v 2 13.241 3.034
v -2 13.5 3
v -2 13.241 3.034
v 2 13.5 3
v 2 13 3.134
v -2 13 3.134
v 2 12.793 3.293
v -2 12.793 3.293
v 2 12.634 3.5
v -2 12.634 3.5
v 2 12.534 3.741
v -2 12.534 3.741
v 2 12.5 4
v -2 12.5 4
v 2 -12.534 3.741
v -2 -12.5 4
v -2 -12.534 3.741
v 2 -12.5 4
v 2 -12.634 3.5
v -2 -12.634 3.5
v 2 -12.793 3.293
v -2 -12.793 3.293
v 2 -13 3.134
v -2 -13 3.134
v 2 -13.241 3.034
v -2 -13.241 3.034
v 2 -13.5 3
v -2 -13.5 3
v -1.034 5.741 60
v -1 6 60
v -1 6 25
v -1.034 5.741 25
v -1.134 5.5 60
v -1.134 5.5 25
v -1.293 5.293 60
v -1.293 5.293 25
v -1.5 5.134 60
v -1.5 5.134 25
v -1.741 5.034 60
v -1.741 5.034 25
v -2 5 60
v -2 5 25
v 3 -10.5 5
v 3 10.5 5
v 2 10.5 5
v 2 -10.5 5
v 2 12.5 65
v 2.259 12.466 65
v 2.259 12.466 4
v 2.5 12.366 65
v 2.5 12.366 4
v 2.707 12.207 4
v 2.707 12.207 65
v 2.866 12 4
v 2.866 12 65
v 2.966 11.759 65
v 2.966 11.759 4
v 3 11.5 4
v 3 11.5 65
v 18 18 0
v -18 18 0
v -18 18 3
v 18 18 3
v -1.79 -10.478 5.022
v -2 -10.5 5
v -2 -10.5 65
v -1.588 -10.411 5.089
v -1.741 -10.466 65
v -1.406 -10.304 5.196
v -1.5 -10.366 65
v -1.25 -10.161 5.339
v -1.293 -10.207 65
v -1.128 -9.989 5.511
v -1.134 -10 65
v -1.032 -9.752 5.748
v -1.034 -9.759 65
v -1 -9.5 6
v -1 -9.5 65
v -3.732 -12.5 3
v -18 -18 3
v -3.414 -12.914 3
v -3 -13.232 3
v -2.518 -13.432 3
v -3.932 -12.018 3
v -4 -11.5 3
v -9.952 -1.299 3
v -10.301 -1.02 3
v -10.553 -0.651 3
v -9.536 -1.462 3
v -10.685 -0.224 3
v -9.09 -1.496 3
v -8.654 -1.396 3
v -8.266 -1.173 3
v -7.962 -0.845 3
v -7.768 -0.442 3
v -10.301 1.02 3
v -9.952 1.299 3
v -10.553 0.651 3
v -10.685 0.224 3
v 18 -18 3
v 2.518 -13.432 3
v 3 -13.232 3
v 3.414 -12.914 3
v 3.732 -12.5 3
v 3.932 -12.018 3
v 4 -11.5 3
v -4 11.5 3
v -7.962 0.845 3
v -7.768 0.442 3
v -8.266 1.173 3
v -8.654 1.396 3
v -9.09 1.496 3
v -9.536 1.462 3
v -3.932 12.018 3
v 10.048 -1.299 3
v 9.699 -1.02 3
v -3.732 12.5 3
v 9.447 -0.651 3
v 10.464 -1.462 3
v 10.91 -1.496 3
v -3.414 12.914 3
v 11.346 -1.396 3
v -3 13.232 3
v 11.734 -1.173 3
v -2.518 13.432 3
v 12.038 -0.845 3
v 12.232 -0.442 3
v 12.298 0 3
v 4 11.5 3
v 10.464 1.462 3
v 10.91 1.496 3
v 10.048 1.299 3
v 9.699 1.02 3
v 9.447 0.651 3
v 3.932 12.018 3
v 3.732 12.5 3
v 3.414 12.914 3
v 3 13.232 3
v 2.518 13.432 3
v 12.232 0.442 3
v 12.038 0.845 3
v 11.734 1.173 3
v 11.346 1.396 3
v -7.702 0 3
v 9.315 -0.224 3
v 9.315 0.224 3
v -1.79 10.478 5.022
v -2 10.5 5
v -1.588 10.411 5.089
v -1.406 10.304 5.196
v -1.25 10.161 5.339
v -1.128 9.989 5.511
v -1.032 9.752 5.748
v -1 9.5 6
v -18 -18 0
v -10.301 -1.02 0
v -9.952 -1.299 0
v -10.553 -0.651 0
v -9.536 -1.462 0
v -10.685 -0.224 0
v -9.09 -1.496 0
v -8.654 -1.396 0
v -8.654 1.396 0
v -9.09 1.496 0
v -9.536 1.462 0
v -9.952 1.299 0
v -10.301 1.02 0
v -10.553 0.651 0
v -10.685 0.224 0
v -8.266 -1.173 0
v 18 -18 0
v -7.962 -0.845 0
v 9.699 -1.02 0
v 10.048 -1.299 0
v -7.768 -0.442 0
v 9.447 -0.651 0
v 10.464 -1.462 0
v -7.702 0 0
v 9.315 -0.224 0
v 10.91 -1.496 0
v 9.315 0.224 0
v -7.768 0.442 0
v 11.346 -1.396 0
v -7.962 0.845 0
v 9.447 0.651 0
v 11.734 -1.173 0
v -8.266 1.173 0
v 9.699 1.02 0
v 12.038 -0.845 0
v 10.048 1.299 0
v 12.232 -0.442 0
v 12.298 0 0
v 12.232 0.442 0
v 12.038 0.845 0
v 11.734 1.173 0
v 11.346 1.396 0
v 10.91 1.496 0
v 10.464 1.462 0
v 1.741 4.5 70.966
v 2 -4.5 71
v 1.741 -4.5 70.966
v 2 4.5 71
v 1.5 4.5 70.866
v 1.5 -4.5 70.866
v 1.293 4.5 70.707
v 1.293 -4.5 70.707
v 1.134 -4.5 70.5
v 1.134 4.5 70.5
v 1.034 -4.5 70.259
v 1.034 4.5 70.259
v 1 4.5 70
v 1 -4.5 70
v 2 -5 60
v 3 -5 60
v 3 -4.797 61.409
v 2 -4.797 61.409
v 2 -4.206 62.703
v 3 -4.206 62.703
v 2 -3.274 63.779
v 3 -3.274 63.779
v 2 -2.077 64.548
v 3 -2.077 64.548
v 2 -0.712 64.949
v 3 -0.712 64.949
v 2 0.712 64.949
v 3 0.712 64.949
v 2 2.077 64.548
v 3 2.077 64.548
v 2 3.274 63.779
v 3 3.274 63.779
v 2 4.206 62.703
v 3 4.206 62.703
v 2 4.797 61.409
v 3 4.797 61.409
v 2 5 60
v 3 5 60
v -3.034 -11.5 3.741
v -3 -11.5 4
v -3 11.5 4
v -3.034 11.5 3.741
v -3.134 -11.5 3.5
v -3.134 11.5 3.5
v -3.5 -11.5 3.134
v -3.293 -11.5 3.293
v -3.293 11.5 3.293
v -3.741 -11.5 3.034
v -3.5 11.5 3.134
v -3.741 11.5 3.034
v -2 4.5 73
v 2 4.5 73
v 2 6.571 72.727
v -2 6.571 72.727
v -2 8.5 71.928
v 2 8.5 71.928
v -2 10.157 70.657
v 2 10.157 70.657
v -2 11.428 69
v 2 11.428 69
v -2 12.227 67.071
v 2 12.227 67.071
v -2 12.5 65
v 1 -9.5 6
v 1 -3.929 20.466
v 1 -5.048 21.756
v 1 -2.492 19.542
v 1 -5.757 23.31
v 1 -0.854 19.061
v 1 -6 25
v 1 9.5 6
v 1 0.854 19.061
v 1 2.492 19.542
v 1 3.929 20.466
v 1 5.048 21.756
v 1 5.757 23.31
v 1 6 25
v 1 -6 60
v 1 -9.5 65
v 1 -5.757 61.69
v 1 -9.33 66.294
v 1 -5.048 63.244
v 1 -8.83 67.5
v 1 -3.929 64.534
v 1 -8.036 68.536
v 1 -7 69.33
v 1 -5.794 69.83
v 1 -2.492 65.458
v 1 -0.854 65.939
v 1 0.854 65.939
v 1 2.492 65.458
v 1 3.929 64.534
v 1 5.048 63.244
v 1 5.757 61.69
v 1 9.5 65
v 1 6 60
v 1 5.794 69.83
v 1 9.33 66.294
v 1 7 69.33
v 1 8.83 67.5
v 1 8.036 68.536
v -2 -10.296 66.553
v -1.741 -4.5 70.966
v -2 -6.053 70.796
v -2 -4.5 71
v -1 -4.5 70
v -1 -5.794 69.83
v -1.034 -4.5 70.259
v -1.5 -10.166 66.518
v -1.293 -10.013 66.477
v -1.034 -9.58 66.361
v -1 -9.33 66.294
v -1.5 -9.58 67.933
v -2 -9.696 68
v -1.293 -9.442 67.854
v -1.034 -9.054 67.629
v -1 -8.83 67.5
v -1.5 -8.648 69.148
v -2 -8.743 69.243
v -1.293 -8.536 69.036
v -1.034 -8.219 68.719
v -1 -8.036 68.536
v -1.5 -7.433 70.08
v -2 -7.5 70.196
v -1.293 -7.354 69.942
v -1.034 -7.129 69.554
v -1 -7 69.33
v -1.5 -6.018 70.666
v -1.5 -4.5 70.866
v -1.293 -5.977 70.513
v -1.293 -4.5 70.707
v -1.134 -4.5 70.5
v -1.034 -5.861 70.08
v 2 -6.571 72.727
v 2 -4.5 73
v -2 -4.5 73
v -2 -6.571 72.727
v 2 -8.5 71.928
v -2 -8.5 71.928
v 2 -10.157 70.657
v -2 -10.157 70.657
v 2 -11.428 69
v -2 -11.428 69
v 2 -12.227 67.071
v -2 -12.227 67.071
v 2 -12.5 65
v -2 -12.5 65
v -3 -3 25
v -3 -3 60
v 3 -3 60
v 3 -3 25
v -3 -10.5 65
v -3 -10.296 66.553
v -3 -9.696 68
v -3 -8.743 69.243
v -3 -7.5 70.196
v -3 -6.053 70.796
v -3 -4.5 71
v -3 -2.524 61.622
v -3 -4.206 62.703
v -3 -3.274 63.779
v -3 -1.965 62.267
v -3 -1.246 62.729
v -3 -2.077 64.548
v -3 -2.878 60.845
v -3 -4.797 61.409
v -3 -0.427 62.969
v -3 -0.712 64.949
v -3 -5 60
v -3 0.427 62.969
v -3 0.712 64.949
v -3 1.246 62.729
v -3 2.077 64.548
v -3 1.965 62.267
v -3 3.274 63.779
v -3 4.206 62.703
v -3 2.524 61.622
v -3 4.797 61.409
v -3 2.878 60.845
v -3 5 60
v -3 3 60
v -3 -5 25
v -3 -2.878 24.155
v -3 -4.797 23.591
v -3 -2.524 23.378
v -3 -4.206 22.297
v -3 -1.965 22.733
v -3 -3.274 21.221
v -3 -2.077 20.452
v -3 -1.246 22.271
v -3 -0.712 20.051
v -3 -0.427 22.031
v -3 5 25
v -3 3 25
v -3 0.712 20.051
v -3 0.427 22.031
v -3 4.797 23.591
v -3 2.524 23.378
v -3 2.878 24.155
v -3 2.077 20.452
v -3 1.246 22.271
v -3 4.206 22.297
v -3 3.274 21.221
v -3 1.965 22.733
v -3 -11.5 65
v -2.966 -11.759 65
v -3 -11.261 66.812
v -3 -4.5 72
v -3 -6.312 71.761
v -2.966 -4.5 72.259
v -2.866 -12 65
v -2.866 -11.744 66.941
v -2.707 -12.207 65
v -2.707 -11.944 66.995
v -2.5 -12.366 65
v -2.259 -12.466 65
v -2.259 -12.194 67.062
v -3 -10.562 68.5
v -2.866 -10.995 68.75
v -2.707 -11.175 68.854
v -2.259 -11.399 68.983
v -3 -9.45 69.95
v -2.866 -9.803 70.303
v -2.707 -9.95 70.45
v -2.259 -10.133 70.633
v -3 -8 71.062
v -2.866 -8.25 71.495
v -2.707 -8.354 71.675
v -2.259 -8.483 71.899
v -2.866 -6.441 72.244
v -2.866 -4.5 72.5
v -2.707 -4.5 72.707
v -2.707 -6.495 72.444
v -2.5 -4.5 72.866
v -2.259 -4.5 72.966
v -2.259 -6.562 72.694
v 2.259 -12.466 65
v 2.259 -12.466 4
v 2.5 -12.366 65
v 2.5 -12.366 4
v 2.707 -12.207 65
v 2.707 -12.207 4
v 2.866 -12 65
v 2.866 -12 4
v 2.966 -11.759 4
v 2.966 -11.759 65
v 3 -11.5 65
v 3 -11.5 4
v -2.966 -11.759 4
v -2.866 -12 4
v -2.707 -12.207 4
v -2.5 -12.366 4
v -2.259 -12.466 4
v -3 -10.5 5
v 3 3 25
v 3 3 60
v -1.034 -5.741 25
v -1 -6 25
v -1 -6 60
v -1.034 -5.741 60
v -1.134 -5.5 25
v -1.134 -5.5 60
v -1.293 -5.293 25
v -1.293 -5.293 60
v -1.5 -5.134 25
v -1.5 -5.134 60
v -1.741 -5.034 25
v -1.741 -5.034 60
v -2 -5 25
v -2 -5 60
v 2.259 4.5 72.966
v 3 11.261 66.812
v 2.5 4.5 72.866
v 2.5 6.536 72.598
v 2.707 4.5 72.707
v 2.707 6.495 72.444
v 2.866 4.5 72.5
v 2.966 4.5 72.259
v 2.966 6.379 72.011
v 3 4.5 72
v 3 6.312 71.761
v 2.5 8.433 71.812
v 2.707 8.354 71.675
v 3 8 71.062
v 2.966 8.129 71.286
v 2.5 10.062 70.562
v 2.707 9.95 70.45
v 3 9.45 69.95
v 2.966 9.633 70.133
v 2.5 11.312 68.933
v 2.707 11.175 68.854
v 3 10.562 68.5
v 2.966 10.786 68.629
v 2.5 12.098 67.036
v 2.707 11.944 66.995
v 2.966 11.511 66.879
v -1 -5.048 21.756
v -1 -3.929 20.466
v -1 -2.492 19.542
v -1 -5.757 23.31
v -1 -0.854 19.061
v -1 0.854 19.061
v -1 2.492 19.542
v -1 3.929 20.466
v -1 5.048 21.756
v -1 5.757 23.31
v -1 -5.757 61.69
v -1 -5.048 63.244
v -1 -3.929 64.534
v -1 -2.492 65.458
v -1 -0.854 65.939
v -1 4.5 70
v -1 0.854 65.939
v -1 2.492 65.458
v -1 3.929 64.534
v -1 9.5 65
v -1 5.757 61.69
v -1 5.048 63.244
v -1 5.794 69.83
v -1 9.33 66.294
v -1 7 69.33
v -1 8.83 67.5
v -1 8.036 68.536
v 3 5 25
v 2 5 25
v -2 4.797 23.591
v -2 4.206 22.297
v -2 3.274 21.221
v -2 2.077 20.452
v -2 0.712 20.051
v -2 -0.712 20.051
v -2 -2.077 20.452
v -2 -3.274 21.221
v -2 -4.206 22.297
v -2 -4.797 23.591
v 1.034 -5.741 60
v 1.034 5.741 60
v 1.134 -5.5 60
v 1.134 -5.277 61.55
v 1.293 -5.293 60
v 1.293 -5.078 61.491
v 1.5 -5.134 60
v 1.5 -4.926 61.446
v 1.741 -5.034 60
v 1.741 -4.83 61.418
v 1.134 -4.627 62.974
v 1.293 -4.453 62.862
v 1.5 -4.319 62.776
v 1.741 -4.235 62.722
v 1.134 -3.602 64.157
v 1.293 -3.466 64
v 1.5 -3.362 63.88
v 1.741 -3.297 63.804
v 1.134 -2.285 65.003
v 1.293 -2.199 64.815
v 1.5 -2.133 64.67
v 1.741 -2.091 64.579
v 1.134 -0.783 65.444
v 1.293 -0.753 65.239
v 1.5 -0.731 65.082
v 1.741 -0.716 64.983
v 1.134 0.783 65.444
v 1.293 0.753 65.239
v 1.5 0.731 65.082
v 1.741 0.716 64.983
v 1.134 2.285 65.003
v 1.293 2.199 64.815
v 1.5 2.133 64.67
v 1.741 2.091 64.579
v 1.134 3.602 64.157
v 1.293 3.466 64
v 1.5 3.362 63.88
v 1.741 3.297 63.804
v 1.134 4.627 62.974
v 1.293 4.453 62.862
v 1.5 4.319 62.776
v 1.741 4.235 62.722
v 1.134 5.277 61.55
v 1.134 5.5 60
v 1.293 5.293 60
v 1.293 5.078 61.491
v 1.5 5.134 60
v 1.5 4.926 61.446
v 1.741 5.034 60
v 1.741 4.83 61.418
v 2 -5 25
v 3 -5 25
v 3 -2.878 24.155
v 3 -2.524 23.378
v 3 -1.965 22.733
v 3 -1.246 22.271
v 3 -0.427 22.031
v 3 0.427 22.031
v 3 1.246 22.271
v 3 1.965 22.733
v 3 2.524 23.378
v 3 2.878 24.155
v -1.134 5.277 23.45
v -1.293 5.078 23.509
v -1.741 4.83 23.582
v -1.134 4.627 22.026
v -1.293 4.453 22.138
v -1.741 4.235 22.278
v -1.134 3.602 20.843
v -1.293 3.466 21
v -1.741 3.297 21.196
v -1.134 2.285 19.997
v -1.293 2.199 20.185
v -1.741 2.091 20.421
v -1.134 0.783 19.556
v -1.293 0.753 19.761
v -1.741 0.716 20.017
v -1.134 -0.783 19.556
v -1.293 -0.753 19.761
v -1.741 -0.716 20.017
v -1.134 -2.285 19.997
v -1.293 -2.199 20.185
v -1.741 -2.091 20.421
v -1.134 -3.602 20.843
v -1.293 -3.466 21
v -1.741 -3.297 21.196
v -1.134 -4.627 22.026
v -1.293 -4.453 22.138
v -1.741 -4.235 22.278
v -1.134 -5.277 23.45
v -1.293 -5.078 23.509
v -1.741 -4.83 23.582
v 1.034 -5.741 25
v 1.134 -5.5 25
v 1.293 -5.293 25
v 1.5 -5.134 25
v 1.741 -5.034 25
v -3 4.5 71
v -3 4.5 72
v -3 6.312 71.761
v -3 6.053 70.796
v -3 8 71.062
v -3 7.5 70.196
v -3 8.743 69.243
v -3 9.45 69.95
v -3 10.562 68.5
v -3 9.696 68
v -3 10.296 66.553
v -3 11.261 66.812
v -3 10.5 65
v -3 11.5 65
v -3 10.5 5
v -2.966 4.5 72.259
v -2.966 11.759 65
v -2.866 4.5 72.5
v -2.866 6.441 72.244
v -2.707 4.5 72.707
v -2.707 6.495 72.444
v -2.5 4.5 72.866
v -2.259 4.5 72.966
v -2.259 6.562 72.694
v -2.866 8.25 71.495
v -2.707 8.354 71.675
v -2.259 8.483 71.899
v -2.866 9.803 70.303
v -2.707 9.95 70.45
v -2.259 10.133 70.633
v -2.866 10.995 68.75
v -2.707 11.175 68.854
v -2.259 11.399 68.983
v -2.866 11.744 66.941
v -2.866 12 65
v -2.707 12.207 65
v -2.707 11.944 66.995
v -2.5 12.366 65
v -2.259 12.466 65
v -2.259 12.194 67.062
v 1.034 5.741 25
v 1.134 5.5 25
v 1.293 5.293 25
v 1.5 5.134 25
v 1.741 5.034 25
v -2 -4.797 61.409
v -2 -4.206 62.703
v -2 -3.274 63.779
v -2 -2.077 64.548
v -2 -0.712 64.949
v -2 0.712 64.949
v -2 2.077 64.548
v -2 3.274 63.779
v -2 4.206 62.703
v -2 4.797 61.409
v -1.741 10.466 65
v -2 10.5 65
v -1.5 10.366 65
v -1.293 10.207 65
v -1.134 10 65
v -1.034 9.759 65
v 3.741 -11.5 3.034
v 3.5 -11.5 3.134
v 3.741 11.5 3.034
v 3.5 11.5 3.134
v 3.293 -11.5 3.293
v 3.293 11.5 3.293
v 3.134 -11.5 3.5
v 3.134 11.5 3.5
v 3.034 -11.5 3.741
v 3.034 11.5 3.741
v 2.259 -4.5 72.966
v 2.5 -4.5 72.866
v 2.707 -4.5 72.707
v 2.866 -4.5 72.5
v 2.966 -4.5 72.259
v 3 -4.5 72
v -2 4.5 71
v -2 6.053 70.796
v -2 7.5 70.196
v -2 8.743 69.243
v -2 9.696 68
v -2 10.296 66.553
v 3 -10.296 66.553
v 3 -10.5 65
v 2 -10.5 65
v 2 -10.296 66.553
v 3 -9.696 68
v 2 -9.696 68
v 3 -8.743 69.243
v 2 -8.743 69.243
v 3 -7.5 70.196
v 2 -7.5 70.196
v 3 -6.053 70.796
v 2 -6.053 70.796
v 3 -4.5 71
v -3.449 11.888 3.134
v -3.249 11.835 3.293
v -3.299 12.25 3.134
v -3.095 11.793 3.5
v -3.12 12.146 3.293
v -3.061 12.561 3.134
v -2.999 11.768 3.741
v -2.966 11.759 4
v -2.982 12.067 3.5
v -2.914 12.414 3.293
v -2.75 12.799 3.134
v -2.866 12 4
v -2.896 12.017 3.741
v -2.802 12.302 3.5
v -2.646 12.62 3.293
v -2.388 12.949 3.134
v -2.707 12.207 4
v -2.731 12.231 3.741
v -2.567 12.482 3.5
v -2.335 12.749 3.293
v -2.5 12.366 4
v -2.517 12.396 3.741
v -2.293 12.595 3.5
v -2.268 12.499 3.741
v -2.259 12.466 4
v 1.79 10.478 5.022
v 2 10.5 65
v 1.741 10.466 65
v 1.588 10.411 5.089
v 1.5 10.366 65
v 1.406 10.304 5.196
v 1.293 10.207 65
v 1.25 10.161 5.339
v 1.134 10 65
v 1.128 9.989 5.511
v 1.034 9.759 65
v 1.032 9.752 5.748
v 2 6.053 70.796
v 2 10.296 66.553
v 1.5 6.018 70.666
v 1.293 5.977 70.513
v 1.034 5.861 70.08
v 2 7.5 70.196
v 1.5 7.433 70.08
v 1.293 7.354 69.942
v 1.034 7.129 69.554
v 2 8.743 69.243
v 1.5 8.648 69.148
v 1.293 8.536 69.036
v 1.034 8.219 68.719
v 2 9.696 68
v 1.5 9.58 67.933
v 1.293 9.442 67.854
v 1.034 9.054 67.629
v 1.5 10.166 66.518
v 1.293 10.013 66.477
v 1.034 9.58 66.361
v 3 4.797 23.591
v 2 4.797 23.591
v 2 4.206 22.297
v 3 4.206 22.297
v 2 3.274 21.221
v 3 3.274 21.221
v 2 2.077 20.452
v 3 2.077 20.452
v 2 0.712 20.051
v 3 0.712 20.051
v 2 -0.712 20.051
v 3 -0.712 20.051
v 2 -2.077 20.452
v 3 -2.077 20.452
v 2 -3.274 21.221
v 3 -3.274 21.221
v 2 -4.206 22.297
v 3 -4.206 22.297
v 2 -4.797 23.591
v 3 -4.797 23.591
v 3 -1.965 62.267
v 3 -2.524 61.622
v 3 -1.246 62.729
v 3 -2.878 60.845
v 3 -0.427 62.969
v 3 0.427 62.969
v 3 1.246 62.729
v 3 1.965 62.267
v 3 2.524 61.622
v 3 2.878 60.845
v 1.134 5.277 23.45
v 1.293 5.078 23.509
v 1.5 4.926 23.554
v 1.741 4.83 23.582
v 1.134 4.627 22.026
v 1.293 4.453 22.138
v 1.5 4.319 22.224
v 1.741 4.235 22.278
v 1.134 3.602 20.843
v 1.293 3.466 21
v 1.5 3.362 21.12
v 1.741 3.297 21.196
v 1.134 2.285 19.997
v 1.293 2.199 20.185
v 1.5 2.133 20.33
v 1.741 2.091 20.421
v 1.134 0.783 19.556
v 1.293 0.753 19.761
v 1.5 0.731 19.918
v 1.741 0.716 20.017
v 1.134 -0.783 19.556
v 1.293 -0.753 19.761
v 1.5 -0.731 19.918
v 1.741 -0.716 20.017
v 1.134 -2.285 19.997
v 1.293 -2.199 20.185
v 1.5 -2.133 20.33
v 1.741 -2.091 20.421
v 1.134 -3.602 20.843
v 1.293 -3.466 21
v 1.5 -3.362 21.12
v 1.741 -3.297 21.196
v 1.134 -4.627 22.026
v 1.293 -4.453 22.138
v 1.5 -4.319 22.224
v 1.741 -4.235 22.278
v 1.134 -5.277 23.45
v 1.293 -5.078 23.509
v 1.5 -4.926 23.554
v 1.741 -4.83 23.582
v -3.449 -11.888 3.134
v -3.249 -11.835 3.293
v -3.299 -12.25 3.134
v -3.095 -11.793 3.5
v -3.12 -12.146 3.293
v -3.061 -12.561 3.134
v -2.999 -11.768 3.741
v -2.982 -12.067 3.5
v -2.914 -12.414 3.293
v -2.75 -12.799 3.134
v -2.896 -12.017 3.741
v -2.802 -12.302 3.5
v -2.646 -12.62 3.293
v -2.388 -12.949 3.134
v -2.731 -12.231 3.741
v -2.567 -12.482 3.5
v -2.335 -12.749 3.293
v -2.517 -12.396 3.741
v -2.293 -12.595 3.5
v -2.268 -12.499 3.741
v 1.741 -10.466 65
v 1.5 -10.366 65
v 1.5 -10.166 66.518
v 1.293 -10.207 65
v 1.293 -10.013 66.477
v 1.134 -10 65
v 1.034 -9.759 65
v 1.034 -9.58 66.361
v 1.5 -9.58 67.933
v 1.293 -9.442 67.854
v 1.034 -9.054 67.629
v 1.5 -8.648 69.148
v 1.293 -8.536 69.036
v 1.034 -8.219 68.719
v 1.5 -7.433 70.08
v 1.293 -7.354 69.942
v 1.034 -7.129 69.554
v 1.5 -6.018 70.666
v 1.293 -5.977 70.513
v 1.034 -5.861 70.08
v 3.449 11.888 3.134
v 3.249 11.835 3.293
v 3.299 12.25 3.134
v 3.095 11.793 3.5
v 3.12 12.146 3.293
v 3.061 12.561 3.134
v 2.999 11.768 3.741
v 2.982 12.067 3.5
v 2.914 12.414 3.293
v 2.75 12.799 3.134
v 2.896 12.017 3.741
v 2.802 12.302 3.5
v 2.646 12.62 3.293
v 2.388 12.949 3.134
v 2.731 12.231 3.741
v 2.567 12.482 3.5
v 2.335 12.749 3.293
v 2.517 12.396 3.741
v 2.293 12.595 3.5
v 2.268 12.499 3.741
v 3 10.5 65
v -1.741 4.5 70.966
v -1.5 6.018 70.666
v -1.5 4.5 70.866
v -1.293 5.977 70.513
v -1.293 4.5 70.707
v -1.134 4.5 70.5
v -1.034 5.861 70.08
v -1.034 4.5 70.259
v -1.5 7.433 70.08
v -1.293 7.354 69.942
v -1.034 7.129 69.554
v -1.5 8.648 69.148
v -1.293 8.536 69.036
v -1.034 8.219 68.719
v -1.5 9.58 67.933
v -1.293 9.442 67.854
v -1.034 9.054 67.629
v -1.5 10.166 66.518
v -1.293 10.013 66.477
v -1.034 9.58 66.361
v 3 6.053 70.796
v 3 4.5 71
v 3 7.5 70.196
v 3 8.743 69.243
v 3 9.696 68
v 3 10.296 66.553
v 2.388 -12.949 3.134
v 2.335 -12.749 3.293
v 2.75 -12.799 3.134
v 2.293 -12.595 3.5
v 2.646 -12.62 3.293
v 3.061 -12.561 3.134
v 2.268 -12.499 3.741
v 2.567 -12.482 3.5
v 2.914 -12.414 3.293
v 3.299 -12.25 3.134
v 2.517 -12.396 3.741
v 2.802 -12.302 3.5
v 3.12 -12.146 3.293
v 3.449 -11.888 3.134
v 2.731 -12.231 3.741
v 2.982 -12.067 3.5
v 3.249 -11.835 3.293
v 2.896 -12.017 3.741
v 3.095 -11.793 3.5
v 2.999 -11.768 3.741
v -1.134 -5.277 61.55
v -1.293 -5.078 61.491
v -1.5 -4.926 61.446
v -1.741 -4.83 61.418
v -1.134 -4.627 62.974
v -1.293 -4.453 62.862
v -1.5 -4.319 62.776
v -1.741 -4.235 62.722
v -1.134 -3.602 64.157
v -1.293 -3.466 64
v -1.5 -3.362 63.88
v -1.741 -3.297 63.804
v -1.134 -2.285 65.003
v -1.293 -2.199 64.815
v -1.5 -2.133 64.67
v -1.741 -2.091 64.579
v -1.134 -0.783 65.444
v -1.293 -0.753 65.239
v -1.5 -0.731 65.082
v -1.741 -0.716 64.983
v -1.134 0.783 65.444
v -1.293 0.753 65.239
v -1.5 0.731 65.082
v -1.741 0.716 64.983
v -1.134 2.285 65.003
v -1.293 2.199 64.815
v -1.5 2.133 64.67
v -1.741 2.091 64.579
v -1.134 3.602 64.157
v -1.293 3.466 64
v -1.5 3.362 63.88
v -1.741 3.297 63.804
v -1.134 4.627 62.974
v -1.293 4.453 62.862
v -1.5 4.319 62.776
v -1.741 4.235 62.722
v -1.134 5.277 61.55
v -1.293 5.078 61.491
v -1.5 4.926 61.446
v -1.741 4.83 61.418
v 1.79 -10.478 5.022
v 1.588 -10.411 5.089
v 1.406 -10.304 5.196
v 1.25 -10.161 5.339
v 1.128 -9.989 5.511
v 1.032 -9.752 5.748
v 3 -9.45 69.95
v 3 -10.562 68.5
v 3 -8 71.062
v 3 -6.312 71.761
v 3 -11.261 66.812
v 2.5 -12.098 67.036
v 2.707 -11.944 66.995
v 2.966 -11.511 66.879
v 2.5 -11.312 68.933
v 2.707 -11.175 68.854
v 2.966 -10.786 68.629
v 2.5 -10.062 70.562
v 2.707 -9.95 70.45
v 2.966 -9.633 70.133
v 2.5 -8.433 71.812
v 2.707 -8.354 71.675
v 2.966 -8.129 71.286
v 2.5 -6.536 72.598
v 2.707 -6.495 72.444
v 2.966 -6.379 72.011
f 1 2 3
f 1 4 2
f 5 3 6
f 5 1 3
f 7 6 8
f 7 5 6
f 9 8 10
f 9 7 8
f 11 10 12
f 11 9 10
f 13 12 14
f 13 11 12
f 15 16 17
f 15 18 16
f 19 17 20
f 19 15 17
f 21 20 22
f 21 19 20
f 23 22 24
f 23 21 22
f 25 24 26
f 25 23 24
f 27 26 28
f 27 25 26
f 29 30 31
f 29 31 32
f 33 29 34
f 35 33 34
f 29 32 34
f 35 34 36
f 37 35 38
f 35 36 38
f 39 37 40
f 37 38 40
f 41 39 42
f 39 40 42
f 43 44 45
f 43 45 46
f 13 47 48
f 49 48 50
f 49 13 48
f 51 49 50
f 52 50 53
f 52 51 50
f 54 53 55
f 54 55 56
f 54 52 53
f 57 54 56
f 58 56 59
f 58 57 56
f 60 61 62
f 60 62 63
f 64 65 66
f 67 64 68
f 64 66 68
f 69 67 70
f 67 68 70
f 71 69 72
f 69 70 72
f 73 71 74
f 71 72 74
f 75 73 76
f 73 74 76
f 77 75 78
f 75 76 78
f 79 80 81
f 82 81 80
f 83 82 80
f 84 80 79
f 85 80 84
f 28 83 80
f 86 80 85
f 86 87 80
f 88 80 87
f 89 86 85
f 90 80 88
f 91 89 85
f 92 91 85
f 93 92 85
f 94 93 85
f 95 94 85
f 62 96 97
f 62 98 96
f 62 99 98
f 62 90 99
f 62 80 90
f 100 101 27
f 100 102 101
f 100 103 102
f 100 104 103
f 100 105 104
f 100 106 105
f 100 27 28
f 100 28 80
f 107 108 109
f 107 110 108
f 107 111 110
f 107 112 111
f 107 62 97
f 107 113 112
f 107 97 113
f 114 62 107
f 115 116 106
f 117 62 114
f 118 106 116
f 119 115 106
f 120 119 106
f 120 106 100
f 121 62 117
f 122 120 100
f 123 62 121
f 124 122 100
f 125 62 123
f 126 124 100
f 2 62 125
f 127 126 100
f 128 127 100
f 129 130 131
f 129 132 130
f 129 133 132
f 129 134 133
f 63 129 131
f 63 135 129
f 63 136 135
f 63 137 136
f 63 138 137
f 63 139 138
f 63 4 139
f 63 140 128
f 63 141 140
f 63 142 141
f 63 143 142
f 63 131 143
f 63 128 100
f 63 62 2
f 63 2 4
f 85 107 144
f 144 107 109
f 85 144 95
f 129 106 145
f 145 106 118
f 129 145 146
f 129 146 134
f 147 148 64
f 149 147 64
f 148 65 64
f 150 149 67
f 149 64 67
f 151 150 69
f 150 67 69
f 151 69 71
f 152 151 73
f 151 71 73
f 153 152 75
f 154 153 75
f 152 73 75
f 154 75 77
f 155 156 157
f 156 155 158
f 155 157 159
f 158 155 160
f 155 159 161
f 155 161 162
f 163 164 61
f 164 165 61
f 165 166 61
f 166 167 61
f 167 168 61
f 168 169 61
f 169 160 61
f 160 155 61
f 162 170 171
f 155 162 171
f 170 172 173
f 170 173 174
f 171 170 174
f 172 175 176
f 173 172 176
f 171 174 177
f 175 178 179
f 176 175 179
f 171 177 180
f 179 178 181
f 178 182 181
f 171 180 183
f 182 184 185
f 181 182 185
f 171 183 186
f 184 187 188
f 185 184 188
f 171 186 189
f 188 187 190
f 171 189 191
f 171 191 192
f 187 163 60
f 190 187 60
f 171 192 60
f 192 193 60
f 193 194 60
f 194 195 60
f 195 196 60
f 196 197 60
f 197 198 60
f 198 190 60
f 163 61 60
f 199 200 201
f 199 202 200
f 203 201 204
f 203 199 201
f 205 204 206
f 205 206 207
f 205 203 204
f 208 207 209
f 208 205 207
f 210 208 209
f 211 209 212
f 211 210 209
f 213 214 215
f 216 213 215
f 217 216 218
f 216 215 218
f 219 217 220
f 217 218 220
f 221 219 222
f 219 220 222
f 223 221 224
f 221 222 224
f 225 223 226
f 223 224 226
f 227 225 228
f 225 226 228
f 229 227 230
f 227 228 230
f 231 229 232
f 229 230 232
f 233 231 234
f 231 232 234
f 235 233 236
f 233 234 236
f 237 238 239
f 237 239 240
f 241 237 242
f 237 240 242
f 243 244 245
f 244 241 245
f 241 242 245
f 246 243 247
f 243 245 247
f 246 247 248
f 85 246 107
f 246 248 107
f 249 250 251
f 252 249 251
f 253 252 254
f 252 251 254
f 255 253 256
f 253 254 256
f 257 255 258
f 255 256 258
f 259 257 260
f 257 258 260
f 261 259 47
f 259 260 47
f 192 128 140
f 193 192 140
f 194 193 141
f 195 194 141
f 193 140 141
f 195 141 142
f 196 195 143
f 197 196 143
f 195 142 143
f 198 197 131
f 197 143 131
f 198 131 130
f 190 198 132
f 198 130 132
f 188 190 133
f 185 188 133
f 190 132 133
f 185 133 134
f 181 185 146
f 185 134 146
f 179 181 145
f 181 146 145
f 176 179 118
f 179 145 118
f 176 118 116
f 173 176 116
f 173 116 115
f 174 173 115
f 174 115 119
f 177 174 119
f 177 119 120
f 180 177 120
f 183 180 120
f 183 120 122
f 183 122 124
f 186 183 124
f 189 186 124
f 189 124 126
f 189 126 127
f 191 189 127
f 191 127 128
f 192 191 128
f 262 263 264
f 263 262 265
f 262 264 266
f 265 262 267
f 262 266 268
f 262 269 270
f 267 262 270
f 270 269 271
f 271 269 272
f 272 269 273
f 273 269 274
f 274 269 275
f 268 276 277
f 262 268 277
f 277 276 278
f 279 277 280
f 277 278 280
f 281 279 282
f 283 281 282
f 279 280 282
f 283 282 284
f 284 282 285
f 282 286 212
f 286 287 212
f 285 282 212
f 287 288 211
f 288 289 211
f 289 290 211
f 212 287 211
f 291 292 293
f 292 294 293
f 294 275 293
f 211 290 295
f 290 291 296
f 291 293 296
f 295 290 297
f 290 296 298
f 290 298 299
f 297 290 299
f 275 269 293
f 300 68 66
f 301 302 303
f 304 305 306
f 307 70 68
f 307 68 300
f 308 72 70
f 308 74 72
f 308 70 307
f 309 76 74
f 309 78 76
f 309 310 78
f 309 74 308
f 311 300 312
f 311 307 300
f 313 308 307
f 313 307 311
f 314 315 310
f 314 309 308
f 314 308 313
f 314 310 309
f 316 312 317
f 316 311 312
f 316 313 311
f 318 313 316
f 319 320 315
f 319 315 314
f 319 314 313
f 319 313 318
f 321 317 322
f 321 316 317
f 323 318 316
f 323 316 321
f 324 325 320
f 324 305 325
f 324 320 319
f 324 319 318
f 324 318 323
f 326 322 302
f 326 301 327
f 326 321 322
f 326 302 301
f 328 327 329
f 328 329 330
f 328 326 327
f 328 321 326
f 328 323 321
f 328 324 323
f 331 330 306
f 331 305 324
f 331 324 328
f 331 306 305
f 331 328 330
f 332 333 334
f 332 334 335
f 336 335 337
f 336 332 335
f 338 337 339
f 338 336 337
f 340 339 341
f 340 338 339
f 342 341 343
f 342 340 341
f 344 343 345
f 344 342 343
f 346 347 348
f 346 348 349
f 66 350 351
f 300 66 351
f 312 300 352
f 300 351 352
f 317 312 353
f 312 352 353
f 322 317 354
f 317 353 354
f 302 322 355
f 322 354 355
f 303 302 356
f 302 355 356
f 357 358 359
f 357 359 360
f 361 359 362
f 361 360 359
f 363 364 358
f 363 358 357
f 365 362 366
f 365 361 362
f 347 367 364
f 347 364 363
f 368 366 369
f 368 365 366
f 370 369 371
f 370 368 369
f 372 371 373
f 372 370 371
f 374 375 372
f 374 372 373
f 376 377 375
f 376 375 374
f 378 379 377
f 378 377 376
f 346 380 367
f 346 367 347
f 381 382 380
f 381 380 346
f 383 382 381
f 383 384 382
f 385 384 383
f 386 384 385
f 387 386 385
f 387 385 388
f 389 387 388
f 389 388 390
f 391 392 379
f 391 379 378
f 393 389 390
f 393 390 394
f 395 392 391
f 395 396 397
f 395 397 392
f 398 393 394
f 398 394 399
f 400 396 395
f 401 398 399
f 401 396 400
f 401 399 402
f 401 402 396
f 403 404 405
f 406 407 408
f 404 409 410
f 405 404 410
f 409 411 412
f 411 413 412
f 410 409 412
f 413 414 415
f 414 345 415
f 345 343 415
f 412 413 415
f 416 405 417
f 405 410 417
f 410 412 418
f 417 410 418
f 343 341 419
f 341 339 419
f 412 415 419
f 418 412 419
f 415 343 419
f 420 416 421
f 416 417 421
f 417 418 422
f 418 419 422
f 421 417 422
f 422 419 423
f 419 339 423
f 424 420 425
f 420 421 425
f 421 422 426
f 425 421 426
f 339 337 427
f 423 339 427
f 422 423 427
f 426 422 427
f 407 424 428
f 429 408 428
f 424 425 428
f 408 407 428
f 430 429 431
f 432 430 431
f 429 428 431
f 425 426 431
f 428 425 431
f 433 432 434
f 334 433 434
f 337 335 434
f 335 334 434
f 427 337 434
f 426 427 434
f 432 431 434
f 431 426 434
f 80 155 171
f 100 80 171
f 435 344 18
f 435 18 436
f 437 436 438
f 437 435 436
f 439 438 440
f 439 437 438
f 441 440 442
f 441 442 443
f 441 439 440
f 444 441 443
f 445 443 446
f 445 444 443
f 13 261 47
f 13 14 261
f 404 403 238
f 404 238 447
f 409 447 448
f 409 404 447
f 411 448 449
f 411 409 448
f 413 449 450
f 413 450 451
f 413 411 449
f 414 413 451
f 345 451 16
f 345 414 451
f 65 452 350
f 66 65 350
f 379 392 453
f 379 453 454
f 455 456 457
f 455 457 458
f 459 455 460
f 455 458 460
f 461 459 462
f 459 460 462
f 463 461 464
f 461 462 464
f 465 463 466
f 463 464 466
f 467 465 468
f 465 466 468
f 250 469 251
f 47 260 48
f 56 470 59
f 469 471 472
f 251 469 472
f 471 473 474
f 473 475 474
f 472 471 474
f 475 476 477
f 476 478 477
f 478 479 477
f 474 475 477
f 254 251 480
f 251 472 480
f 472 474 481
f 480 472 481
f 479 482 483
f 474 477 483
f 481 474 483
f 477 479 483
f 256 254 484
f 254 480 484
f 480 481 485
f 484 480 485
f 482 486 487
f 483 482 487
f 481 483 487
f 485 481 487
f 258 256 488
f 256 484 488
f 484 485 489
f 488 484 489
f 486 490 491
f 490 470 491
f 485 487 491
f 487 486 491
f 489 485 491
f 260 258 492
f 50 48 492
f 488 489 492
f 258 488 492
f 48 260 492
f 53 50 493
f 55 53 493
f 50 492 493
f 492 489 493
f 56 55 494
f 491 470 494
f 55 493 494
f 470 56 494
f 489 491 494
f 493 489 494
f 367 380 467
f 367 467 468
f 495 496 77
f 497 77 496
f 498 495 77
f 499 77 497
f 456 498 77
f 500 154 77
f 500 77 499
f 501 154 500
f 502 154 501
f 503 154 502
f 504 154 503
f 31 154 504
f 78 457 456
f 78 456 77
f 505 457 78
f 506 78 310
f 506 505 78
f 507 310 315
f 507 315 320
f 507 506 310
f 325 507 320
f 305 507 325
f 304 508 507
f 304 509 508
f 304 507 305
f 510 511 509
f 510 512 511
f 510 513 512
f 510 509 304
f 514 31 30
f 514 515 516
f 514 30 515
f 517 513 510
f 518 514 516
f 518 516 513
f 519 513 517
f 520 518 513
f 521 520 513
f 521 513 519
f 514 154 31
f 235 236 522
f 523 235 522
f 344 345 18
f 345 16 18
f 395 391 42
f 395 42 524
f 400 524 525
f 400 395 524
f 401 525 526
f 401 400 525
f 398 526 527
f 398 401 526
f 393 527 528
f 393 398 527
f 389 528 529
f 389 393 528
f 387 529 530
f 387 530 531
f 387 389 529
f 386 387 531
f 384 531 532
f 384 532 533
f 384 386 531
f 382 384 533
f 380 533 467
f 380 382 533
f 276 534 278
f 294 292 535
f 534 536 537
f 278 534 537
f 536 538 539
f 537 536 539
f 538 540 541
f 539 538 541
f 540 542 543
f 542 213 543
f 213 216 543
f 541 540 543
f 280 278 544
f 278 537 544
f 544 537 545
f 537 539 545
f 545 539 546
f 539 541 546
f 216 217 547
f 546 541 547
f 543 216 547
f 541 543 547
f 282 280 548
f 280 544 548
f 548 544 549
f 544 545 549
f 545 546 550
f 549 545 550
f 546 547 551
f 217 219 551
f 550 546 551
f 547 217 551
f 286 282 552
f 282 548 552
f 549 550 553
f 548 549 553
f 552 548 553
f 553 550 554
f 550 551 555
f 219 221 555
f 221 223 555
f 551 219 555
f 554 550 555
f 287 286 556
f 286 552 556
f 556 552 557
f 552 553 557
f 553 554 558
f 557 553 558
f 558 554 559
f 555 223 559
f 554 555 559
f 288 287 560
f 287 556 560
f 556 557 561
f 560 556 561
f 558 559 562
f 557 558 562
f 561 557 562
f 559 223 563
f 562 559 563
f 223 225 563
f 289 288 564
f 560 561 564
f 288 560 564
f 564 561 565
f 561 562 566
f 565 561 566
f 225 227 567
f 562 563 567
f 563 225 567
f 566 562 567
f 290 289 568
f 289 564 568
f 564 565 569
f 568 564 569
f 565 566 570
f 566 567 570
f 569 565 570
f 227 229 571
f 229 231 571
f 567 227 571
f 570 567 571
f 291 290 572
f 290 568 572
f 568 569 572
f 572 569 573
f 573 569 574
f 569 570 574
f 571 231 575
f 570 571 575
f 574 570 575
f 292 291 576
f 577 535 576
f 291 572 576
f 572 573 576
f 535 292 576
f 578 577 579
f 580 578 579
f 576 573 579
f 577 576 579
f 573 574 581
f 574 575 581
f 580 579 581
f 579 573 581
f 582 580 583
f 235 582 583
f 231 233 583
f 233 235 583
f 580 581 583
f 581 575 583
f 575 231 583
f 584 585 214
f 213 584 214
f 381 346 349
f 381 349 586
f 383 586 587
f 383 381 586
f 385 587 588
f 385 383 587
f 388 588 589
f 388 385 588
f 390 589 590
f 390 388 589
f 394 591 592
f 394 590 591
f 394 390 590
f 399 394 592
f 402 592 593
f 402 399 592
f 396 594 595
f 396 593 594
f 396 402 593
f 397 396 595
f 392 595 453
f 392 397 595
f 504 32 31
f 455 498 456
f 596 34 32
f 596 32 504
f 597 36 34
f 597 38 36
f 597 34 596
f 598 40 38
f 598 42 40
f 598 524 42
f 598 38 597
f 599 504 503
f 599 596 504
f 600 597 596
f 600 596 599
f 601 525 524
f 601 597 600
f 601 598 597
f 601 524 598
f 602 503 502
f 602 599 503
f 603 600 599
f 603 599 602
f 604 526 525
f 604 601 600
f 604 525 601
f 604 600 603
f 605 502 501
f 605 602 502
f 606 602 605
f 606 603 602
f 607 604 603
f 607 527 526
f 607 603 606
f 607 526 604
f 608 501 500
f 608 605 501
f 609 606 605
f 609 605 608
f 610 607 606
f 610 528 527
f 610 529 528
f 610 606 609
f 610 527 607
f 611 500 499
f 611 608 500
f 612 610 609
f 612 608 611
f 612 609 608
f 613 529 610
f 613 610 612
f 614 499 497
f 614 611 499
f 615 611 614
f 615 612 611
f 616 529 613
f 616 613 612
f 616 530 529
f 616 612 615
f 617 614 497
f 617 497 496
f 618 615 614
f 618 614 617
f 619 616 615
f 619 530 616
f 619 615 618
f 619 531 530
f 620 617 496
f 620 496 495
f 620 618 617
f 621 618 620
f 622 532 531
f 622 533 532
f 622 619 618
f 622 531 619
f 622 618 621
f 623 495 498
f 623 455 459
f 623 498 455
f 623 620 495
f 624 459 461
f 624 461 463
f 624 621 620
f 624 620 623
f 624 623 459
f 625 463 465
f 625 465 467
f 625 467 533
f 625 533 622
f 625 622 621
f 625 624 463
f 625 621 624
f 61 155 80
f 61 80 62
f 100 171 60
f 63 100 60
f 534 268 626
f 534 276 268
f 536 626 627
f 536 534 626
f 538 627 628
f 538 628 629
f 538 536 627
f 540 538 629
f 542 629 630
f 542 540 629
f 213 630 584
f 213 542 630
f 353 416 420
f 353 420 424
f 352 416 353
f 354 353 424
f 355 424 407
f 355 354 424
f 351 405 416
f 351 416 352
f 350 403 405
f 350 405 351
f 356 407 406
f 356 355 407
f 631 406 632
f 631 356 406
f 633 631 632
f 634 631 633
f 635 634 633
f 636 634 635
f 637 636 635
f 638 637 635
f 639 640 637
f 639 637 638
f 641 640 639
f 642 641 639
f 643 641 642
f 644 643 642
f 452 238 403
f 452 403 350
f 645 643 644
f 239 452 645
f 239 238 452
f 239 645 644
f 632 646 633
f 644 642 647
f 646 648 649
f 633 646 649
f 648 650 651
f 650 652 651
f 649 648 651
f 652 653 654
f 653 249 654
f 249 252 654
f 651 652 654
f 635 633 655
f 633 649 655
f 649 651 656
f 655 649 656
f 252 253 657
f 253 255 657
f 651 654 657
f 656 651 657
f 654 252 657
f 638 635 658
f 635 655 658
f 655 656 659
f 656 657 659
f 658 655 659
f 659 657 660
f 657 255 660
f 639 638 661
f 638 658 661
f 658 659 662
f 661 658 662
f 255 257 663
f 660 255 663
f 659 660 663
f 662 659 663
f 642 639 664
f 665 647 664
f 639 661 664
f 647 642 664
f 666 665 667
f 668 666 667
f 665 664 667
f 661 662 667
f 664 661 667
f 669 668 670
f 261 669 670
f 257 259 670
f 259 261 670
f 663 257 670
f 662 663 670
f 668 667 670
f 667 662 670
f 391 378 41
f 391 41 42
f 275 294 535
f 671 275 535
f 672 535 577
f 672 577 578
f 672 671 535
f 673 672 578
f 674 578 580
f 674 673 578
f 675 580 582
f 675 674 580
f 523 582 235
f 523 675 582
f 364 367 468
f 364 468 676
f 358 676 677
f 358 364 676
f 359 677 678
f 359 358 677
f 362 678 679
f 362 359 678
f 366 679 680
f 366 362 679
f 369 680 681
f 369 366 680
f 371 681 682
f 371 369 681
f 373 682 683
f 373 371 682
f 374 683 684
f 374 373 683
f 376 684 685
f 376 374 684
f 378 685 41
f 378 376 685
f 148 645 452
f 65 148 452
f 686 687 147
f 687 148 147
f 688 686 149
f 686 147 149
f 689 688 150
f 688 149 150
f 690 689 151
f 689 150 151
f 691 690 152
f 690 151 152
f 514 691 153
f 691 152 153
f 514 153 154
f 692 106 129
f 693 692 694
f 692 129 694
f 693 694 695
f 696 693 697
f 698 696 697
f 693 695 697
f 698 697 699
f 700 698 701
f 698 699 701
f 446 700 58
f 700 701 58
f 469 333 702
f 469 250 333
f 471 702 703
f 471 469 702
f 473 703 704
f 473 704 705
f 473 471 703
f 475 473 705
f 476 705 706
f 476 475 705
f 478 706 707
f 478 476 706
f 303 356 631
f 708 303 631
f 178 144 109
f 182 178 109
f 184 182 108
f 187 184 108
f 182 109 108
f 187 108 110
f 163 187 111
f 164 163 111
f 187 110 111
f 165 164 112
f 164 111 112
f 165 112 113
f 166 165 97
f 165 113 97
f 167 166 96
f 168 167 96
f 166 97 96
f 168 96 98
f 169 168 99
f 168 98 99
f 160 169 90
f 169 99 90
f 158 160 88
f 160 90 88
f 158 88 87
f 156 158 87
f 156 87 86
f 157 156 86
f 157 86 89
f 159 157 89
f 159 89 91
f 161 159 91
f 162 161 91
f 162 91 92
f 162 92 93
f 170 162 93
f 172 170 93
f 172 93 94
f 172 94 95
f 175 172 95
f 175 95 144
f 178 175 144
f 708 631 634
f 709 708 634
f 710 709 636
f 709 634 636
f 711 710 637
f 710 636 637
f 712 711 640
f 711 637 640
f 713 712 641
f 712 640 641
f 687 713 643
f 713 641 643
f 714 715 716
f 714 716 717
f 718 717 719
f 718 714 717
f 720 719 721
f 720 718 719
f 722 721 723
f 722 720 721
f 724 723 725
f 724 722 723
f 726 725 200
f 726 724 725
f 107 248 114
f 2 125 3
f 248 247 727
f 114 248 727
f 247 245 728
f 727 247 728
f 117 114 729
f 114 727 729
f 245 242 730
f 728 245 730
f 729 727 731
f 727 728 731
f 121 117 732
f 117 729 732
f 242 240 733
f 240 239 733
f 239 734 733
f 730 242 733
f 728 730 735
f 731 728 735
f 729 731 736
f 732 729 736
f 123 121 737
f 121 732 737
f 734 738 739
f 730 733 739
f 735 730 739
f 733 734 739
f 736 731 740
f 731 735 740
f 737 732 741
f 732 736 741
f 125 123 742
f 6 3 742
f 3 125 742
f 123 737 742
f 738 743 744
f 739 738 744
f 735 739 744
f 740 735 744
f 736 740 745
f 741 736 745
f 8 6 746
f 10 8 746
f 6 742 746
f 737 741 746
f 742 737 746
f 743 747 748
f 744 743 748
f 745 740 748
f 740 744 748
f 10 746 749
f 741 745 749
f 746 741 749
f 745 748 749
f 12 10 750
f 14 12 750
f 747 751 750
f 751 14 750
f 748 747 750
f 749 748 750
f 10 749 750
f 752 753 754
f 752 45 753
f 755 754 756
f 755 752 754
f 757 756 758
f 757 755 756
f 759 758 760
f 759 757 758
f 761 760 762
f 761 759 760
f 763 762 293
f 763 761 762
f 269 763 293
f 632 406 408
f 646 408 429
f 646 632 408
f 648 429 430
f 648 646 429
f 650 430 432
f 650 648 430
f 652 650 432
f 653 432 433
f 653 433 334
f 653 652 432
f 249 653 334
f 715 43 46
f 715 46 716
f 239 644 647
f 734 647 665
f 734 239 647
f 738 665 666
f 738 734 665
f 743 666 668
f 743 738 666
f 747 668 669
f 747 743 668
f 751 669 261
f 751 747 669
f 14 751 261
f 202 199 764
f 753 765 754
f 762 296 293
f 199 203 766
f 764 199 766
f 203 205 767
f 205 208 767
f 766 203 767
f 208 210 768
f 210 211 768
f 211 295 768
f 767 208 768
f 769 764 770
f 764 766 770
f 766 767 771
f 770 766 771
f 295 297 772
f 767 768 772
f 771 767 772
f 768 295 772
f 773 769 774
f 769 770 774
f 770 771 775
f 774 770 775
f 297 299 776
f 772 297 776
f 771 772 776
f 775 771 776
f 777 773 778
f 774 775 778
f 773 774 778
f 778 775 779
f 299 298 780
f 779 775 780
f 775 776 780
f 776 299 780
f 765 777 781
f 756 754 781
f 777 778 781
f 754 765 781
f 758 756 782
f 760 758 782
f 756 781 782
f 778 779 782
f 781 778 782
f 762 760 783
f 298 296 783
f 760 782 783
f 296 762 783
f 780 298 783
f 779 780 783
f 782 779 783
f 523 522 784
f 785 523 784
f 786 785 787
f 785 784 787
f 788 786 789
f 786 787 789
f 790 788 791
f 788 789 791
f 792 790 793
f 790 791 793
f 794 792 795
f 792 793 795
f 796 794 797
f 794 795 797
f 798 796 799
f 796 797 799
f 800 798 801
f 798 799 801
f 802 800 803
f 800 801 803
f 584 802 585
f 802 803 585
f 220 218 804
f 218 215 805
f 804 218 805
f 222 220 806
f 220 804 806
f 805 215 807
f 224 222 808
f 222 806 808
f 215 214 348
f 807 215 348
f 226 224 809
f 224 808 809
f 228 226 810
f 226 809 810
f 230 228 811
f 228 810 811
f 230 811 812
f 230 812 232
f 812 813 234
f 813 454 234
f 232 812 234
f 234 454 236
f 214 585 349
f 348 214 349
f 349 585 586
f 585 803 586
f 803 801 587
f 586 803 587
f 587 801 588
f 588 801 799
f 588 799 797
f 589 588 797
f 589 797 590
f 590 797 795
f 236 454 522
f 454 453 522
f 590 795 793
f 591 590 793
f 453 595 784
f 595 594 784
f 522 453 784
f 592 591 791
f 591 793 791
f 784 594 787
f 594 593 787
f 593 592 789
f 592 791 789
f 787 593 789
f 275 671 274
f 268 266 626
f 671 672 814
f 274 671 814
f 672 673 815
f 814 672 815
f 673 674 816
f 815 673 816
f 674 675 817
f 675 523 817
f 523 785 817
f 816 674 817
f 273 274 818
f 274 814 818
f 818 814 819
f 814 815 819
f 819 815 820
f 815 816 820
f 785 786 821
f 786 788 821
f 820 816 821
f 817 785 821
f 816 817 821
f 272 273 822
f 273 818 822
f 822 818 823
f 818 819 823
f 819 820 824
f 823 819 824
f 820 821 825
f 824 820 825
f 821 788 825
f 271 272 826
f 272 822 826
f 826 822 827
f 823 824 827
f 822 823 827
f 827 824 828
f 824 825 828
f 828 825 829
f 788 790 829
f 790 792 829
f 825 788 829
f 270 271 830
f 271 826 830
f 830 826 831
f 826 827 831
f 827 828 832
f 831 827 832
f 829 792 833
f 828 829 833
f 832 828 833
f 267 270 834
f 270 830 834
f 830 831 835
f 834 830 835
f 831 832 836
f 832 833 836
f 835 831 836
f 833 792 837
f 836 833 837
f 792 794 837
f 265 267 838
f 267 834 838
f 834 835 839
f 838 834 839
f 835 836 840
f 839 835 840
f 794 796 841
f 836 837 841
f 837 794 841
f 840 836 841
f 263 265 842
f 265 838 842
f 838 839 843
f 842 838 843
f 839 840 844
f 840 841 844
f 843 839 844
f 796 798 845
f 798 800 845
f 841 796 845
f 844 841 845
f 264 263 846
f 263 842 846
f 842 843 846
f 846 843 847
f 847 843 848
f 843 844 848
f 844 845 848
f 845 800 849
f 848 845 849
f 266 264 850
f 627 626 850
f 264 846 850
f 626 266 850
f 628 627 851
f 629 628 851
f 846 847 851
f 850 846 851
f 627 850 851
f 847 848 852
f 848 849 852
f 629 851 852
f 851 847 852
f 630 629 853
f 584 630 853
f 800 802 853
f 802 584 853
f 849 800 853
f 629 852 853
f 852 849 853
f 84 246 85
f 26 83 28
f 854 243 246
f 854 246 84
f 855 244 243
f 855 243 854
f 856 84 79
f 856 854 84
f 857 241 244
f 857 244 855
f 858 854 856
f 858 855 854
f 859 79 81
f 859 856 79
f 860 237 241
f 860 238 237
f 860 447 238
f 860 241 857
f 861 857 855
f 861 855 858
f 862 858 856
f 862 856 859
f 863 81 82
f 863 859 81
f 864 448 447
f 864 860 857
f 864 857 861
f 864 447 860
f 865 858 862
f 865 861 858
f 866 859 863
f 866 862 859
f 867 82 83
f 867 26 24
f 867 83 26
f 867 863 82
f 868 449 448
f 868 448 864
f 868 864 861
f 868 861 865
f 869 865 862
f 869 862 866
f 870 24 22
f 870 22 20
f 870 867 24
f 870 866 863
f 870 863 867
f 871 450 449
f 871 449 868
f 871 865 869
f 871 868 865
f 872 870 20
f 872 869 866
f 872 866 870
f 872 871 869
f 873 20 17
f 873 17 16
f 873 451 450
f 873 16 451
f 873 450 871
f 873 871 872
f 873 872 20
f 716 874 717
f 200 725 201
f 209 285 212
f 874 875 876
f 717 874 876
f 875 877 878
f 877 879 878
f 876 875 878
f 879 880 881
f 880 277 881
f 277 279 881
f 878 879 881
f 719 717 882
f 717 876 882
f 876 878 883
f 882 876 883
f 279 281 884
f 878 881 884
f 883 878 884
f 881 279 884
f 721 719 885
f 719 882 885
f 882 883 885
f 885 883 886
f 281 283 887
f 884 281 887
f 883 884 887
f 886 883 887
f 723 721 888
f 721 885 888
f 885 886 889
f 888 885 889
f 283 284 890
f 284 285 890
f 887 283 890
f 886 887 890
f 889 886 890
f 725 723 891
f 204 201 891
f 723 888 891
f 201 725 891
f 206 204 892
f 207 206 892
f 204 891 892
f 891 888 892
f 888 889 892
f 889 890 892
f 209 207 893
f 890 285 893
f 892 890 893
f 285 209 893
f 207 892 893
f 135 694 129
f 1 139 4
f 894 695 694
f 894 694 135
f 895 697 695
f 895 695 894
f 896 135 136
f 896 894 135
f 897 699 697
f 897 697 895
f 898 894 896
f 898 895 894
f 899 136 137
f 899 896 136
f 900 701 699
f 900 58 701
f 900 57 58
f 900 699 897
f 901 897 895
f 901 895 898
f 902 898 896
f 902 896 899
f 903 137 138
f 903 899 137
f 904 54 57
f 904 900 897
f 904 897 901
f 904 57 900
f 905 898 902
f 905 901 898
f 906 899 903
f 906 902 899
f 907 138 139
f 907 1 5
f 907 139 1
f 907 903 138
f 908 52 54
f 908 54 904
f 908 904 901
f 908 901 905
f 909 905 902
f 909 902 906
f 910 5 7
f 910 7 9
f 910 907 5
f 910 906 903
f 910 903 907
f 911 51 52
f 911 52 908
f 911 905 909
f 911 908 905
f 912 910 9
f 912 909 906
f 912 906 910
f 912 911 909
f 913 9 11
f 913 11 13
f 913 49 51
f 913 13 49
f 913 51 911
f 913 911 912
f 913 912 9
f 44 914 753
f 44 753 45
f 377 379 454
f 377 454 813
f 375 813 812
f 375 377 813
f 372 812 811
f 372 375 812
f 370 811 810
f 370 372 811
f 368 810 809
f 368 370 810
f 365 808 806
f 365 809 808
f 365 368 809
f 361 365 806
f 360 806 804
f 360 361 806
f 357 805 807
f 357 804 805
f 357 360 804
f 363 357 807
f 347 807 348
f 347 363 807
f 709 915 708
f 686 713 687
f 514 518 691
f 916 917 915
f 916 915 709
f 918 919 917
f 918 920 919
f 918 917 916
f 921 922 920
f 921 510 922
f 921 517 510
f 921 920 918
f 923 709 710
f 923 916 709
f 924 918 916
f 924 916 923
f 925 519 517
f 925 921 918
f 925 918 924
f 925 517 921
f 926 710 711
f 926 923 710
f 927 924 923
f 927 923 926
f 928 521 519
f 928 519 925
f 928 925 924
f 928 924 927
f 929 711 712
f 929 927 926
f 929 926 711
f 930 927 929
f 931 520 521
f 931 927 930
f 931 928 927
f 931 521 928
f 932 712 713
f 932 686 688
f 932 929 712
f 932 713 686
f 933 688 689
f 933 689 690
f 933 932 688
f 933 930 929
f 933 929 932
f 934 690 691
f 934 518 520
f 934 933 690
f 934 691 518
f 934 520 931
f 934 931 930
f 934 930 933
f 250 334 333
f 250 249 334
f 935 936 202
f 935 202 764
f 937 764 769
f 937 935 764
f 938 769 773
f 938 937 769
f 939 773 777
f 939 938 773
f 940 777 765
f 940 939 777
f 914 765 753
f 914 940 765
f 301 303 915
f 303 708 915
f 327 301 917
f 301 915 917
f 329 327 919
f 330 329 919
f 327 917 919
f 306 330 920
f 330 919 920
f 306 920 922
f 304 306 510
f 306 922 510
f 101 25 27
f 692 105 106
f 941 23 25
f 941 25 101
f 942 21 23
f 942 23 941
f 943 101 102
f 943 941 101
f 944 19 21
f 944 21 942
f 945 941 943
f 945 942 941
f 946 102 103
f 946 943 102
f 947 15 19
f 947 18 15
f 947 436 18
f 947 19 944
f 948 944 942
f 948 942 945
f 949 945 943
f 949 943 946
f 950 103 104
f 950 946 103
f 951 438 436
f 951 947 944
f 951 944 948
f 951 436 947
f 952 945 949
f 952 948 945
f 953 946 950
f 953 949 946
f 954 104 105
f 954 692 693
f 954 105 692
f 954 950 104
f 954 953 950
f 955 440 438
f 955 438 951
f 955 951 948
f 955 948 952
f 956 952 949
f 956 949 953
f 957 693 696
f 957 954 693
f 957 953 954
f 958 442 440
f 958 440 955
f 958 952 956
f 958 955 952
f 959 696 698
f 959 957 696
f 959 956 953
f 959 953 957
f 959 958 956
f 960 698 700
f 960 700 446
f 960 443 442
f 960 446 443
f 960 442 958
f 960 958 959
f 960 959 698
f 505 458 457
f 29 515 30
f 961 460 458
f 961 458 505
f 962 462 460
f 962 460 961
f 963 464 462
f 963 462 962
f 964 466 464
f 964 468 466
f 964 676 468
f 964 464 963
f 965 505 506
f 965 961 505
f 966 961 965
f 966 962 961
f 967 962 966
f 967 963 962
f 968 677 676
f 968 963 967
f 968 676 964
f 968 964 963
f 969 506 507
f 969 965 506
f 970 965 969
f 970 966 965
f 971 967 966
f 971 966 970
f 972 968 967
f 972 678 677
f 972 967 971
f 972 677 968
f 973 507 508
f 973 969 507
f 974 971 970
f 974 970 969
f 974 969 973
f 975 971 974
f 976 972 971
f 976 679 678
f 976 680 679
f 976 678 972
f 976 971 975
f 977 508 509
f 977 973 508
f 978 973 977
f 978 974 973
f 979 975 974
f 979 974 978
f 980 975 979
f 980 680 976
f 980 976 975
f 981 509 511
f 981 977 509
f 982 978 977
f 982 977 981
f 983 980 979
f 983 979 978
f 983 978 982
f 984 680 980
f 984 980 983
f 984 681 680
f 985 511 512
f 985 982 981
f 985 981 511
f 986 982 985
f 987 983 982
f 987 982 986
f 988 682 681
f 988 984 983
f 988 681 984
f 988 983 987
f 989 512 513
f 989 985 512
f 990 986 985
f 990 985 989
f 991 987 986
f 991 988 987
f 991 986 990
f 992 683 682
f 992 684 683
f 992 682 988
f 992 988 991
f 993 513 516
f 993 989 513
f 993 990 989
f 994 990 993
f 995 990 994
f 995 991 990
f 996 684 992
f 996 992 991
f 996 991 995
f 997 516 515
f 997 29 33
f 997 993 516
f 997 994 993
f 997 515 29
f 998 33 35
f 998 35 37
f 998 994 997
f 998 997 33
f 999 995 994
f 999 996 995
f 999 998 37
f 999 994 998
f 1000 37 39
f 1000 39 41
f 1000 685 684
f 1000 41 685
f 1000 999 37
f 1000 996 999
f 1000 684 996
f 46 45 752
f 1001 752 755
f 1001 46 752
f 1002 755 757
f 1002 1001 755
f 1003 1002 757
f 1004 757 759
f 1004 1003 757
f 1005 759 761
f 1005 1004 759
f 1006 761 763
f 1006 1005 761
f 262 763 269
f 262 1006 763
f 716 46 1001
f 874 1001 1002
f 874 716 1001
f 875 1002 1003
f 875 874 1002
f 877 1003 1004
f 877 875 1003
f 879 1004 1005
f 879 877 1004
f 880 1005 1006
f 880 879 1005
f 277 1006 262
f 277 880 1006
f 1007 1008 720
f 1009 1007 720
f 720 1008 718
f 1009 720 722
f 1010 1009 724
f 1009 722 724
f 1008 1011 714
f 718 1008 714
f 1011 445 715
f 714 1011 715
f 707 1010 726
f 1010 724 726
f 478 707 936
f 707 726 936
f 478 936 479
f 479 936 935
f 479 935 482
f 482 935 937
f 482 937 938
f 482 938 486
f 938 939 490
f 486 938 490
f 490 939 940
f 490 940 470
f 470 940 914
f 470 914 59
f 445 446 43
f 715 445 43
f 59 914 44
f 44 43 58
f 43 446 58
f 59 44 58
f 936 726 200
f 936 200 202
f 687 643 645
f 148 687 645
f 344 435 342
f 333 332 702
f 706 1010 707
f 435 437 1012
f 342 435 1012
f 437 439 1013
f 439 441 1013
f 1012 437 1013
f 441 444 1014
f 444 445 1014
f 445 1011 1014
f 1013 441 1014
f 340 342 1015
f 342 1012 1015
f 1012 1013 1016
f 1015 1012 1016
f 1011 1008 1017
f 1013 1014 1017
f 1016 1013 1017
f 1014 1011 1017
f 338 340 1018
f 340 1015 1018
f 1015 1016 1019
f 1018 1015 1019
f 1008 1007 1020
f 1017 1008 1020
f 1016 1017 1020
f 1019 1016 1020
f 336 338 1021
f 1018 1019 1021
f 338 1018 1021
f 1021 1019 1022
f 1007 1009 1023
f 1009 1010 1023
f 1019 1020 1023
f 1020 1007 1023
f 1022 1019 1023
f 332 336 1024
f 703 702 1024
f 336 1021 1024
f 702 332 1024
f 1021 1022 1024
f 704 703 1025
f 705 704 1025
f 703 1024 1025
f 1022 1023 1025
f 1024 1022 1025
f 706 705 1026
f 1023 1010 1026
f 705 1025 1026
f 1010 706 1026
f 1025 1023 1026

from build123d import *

# Parameters (mm, degrees)
SKETCH1_W               = 36
SKETCH1_H               = 36
BOSS_EXTRUDE1_DEPTH     = 3
SKETCH2_R               = 1.5
CUT_EXTRUDE1_DEPTH      = 4
SKETCH3_W               = 6
SKETCH3_H               = 25
BOSS_EXTRUDE2_DEPTH     = 70
CUT_EXTRUDE2_DEPTH      = 41
CUT_EXTRUDE2_DEPTH_BACK = 19
FILLET1_R               = 8
CUT_EXTRUDE3_DEPTH      = 2
FILLET2_R               = 1


with BuildPart() as part:
    # Sketch1 → Boss-Extrude1 (new body)
    with BuildSketch(Plane.XY):
        Rectangle(SKETCH1_W, SKETCH1_H)
    extrude(amount=BOSS_EXTRUDE1_DEPTH)

    # Sketch2 → Cut-Extrude1 (cut, through all)
    with BuildSketch(Plane.XY.offset(3)):
        with Locations((10.79827875, 0)):
            Circle(SKETCH2_R)
        with Locations((-9.20172125, 0)):
            Circle(SKETCH2_R)
    extrude(amount=-CUT_EXTRUDE1_DEPTH, mode=Mode.SUBTRACT)

    # Sketch3 → Boss-Extrude2 (add)
    with BuildSketch(Plane.XY.offset(3)):
        Rectangle(SKETCH3_W, SKETCH3_H)
    extrude(amount=BOSS_EXTRUDE2_DEPTH)

    # Sketch6 → Cut-Extrude2 (cut, two sides)
    with BuildSketch(Plane(origin=(0, 0, 0), x_dir=(0, 0, -1), z_dir=(1, 0, 0))) as cut_extrude2_sk:
        with BuildLine():
            Line((-25, 3), (-60, 3))
            ThreePointArc((-60, 3), (-63, 0), (-60, -3))
            Line((-60, -3), (-25, -3))
            ThreePointArc((-25, -3), (-22, 0), (-25, 3))
        make_face()
    extrude(amount=CUT_EXTRUDE2_DEPTH, mode=Mode.SUBTRACT)
    extrude(cut_extrude2_sk.sketch, amount=-CUT_EXTRUDE2_DEPTH_BACK, mode=Mode.SUBTRACT)

    # Fillet1
    fillet1_edges = [part.edges().sort_by_distance(p)[0] for p in [
        (0, -12.5, 73),
        (0, 12.5, 73),
    ]]
    fillet(fillet1_edges, radius=FILLET1_R)

    # Sketch7 → Cut-Extrude3 (cut)
    with BuildSketch(Plane.ZY.offset(3)):
        with BuildLine():
            Line((65, 10.5), (5, 10.5))
            Line((5, 10.5), (5, -10.5))
            Line((5, -10.5), (65, -10.5))
            ThreePointArc((65, -10.5), (69.242640687, -8.742640687), (71, -4.5))
            Line((71, -4.5), (71, 4.5))
            ThreePointArc((71, 4.5), (69.242640687, 8.742640687), (65, 10.5))
        make_face()
        with BuildLine():
            Line((60, 5), (25, 5))
            ThreePointArc((25, 5), (20, 0), (25, -5))
            Line((25, -5), (60, -5))
            ThreePointArc((60, -5), (65, 0), (60, 5))
        make_face(mode=Mode.SUBTRACT)
    cut_extrude3 = extrude(amount=-CUT_EXTRUDE3_DEPTH, mode=Mode.SUBTRACT)

    # Mirror1: Cut-Extrude3 across plane
    add(cut_extrude3.mirror(Plane(origin=(0, 0, 0), x_dir=(0, 0, 1), z_dir=(1, 0, 0))), mode=Mode.SUBTRACT)

    # Fillet2
    fillet2_edges = [part.edges().sort_by_distance(p)[0] for p in [
        (1, 8.742640687, 69.242640687),
        (1, 10.5, 35),
        (1, 0, 5),
        (1, -10.5, 35),
        (1, -8.742640687, 69.242640687),
        (1, 0, 71),
        (1, 0, 65),
        (1, 5, 42.5),
        (1, 0, 20),
        (1, -5, 42.5),
        (-3, 0, 3),
        (0, -12.5, 3),
        (3, 0, 3),
        (0, 12.5, 3),
        (-3, 0, 73),
        (3, 0, 73),
        (3, 12.5, 34),
        (3, -12.5, 34),
        (3, 10.156854249, 70.656854249),
        (3, -10.156854249, 70.656854249),
        (-3, -12.5, 34),
        (-3, 12.5, 34),
        (-3, 10.156854249, 70.656854249),
        (-3, -10.156854249, 70.656854249),
        (-1, 8.742640687, 69.242640687),
        (-1, 0, 71),
        (-1, -8.742640687, 69.242640687),
        (-1, -10.5, 35),
        (-1, 0, 5),
        (-1, 10.5, 35),
        (-1, -5, 42.5),
        (-1, 0, 65),
        (-1, 5, 42.5),
        (-1, 0, 20),
    ]]
    fillet(fillet2_edges, radius=FILLET2_R)


solid = part.part
